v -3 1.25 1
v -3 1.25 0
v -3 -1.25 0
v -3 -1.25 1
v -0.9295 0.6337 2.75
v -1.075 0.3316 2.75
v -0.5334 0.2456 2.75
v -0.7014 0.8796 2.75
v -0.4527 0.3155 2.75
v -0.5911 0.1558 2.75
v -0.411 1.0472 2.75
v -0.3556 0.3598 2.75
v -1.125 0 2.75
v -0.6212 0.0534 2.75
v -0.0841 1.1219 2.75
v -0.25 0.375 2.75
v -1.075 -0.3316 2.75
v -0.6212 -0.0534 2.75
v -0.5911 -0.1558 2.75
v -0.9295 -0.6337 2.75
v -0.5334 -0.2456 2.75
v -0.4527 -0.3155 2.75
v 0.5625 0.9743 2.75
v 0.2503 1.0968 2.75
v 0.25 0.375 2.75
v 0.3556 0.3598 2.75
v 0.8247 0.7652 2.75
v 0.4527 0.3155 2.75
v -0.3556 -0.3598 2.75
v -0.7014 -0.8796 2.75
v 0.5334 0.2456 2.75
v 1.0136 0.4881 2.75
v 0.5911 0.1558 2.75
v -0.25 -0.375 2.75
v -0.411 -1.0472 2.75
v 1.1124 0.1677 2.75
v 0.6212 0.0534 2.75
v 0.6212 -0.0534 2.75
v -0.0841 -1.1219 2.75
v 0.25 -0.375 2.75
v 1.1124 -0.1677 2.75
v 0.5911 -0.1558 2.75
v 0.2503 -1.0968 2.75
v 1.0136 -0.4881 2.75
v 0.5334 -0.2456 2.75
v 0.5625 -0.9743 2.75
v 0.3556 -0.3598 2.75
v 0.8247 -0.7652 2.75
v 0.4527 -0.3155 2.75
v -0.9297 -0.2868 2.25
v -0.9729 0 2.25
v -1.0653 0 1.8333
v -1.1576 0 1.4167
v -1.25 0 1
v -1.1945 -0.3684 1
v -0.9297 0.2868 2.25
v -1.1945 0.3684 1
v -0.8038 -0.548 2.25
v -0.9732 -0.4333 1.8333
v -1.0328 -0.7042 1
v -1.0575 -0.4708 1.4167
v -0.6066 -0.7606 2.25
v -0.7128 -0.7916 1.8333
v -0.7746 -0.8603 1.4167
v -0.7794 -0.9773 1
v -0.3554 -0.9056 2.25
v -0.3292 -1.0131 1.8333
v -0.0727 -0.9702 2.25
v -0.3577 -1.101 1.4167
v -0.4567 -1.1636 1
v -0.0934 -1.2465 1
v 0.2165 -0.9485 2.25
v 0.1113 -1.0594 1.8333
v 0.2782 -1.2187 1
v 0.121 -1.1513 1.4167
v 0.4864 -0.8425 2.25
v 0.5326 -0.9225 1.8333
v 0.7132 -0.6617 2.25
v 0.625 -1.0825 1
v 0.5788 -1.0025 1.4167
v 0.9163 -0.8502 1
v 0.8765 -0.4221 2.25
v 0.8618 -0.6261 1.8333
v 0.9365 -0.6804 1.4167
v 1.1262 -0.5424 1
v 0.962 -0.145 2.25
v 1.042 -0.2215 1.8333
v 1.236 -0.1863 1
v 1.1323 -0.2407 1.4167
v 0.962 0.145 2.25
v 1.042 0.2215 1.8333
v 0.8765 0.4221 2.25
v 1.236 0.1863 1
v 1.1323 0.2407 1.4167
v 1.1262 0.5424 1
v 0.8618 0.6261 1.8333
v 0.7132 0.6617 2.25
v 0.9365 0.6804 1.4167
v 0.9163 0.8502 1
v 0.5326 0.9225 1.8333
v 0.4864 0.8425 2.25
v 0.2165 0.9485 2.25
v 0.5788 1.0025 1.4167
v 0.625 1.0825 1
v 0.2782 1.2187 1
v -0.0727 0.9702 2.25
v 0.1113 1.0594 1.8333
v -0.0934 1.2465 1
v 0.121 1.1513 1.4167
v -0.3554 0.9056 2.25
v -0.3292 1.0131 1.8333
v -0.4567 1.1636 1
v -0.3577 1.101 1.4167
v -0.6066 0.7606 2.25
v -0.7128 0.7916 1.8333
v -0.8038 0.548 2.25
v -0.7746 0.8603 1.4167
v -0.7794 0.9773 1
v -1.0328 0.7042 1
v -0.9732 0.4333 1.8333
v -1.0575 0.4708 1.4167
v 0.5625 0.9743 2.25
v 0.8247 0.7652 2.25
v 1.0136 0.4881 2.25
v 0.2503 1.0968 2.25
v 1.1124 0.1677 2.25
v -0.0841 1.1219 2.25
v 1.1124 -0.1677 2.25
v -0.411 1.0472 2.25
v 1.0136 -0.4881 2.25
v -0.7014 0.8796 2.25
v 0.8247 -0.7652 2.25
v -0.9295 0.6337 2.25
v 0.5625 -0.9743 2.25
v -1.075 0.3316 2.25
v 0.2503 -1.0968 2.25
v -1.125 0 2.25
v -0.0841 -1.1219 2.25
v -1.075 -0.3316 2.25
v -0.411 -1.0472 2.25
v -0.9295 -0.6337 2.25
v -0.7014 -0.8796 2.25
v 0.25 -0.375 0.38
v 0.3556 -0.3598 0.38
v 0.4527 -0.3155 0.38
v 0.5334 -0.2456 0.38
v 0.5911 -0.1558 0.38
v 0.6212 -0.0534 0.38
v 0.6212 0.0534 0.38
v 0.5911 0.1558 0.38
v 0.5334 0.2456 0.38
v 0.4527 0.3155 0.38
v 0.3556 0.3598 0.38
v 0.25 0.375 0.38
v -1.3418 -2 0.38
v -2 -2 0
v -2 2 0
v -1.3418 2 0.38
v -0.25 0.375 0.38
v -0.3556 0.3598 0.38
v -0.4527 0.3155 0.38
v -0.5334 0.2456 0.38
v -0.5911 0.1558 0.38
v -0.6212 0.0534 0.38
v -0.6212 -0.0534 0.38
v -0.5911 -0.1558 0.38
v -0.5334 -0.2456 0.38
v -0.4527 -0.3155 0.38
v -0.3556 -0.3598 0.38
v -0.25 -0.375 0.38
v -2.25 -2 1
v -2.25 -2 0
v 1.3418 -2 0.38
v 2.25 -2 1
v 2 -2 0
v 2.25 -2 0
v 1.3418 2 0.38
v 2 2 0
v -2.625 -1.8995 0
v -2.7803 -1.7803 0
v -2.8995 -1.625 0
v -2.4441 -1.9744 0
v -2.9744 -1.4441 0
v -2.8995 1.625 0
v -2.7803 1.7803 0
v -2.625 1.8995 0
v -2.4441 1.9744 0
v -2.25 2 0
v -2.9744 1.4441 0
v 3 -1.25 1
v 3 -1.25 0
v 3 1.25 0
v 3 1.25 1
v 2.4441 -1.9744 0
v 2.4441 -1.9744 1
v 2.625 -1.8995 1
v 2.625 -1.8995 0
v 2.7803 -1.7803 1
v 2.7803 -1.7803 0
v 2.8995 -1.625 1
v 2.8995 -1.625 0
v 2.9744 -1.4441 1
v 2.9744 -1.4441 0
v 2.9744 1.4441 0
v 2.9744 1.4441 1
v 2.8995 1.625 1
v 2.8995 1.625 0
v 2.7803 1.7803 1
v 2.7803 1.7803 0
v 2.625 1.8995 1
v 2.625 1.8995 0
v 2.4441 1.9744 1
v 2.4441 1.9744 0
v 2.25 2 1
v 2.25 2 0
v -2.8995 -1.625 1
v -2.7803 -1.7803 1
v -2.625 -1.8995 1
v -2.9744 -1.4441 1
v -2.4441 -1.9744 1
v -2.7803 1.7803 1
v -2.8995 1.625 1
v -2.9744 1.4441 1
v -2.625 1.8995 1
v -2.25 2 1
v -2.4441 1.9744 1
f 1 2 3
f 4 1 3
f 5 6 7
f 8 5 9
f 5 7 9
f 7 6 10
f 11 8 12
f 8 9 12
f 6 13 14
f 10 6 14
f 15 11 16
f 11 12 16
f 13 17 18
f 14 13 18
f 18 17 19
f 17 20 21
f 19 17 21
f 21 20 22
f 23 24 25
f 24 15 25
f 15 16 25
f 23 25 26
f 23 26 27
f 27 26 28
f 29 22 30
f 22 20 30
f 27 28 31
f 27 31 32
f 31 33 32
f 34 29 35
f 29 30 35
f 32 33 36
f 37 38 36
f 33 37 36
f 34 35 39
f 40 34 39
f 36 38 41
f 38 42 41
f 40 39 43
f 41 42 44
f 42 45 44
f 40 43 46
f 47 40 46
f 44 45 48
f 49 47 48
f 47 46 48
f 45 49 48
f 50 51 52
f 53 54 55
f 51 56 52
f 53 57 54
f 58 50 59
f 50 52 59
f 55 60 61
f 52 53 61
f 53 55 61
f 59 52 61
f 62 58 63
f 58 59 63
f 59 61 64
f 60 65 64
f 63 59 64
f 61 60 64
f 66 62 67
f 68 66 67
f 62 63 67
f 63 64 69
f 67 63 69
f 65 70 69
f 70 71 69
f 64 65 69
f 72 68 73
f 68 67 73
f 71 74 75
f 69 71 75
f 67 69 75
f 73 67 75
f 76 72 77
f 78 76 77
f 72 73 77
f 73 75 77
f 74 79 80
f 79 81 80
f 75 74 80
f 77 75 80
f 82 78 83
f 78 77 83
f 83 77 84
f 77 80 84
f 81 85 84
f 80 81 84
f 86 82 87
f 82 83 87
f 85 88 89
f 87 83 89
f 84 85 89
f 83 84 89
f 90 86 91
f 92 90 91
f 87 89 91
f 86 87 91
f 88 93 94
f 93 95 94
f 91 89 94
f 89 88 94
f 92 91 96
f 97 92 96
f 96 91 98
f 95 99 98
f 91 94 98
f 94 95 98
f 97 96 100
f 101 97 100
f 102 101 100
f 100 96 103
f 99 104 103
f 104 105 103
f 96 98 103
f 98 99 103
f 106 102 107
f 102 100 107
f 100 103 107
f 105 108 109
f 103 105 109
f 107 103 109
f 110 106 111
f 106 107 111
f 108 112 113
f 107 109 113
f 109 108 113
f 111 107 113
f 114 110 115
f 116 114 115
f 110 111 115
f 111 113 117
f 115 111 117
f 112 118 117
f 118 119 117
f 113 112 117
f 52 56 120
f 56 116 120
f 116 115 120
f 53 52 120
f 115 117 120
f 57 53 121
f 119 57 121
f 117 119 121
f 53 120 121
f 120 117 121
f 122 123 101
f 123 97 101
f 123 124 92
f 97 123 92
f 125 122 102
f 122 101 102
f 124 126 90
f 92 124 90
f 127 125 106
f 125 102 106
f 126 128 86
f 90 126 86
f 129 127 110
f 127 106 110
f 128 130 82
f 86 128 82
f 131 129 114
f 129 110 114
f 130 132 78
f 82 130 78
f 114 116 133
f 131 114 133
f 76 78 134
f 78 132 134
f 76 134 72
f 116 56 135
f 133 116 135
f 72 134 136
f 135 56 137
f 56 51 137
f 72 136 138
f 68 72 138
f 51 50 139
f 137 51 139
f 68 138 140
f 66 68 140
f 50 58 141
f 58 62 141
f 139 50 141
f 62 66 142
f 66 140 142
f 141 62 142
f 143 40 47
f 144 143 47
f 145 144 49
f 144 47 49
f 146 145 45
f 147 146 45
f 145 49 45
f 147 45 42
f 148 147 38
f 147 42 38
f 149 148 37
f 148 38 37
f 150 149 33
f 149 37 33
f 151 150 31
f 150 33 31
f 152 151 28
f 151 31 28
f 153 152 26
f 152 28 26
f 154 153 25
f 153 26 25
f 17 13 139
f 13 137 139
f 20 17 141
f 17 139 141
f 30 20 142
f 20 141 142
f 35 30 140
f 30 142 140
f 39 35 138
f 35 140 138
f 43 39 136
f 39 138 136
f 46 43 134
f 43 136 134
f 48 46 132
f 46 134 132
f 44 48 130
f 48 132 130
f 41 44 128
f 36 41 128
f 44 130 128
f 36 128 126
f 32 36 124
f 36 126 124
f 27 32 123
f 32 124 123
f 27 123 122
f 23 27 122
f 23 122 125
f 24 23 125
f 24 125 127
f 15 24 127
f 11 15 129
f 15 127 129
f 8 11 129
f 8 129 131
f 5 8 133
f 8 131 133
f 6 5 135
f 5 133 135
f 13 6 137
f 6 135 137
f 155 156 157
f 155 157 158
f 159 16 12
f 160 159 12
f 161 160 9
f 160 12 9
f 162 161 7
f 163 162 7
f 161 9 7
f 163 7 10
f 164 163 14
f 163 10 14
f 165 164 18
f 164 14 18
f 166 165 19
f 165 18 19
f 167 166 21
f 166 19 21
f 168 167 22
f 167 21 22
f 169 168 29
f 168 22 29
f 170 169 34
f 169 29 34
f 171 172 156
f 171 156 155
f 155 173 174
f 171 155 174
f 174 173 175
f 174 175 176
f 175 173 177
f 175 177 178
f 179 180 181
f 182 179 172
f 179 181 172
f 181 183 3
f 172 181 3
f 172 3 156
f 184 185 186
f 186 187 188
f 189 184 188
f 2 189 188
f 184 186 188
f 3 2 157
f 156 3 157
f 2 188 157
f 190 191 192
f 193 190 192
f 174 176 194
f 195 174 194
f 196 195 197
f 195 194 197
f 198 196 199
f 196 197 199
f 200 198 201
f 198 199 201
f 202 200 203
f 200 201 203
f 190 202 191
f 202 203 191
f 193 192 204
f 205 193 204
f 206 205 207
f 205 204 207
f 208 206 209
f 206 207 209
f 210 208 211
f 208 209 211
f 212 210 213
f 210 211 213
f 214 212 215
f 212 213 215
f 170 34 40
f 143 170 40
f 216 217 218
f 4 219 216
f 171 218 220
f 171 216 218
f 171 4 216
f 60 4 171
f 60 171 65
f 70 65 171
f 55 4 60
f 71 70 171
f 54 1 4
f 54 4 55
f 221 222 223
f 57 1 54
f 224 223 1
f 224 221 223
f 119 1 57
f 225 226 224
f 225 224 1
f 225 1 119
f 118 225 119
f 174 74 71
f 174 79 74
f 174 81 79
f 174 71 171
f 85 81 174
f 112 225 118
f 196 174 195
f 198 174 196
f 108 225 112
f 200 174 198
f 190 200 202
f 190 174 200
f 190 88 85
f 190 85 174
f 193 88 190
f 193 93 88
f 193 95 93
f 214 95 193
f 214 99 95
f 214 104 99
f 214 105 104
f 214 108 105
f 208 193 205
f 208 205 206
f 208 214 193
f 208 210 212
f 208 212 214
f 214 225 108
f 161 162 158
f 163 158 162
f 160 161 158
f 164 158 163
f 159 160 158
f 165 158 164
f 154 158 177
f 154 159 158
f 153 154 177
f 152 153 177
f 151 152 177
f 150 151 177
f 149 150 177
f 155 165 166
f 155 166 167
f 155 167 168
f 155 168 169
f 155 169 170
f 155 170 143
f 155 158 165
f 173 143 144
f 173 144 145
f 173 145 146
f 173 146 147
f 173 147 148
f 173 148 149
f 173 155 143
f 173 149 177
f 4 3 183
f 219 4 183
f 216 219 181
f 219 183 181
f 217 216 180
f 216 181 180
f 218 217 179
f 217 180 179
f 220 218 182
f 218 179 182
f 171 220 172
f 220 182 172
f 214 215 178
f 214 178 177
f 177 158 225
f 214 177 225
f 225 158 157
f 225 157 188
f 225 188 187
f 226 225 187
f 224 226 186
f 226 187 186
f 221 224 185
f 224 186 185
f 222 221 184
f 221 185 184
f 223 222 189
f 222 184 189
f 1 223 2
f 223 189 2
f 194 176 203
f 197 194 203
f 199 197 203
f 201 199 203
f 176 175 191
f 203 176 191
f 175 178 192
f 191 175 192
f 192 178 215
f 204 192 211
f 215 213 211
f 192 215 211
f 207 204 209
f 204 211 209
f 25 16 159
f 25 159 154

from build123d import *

# Parameters (mm, degrees)
PAD_DEPTH         = 1
POCKET_DEPTH      = 4.001
POCKET_DEPTH_BACK = -0.001
POCKET001_DEPTH   = 2.751


with BuildPart() as part:
    # Sketch (on XY_Plane of Origin) → Pad (new body)
    with BuildSketch(Plane.XY):
        with BuildLine():
            Line((-3, 1.25), (-3, -1.25))
            ThreePointArc((-3, -1.25), (-2.78033, -1.78033), (-2.25, -2))
            Line((-2.25, -2), (2.25, -2))
            ThreePointArc((2.25, -2), (2.78033, -1.78033), (3, -1.25))
            Line((3, -1.25), (3, 1.25))
            ThreePointArc((3, 1.25), (2.78033, 1.78033), (2.25, 2))
            Line((2.25, 2), (-2.25, 2))
            ThreePointArc((-2.25, 2), (-2.78033, 1.78033), (-3, 1.25))
        make_face()
    extrude(amount=PAD_DEPTH)

    # Sketch001 (on Face3 of Pad) → Pocket (cut, two sides)
    with BuildSketch(Plane.XZ.offset(2)) as pocket_sk:
        Polygon((-2, 0), (-1.341821, 0.38), (1.341821, 0.38), (2, 0), align=None)
    extrude(amount=-POCKET_DEPTH, mode=Mode.SUBTRACT)
    extrude(pocket_sk.sketch, amount=-POCKET_DEPTH_BACK, mode=Mode.SUBTRACT)

    # Sketch002 (on XZ_Plane of Origin) → Revolution (revolve)
    with BuildSketch(Plane.XZ):
        Polygon((0, 1), (0, 2.75), (-1.125, 2.75), (-1.125, 2.25), (-0.972882, 2.25), (-1.25, 1), align=None)
    revolve(axis=Axis((0, 0, 0), (0, 0, 1)))

    # Sketch003 (on Face1 of Revolution) → Pocket001 (cut, through all)
    with BuildSketch(Plane.XY.offset(2.75)):
        with BuildLine():
            ThreePointArc((-0.25, 0.375), (-0.625, 0), (-0.25, -0.375))
            Line((-0.25, -0.375), (0.25, -0.375))
            ThreePointArc((0.25, -0.375), (0.625, 0), (0.25, 0.375))
            Line((-0.25, 0.375), (0.25, 0.375))
        make_face()
    extrude(amount=-POCKET001_DEPTH, mode=Mode.SUBTRACT)


solid = part.part
